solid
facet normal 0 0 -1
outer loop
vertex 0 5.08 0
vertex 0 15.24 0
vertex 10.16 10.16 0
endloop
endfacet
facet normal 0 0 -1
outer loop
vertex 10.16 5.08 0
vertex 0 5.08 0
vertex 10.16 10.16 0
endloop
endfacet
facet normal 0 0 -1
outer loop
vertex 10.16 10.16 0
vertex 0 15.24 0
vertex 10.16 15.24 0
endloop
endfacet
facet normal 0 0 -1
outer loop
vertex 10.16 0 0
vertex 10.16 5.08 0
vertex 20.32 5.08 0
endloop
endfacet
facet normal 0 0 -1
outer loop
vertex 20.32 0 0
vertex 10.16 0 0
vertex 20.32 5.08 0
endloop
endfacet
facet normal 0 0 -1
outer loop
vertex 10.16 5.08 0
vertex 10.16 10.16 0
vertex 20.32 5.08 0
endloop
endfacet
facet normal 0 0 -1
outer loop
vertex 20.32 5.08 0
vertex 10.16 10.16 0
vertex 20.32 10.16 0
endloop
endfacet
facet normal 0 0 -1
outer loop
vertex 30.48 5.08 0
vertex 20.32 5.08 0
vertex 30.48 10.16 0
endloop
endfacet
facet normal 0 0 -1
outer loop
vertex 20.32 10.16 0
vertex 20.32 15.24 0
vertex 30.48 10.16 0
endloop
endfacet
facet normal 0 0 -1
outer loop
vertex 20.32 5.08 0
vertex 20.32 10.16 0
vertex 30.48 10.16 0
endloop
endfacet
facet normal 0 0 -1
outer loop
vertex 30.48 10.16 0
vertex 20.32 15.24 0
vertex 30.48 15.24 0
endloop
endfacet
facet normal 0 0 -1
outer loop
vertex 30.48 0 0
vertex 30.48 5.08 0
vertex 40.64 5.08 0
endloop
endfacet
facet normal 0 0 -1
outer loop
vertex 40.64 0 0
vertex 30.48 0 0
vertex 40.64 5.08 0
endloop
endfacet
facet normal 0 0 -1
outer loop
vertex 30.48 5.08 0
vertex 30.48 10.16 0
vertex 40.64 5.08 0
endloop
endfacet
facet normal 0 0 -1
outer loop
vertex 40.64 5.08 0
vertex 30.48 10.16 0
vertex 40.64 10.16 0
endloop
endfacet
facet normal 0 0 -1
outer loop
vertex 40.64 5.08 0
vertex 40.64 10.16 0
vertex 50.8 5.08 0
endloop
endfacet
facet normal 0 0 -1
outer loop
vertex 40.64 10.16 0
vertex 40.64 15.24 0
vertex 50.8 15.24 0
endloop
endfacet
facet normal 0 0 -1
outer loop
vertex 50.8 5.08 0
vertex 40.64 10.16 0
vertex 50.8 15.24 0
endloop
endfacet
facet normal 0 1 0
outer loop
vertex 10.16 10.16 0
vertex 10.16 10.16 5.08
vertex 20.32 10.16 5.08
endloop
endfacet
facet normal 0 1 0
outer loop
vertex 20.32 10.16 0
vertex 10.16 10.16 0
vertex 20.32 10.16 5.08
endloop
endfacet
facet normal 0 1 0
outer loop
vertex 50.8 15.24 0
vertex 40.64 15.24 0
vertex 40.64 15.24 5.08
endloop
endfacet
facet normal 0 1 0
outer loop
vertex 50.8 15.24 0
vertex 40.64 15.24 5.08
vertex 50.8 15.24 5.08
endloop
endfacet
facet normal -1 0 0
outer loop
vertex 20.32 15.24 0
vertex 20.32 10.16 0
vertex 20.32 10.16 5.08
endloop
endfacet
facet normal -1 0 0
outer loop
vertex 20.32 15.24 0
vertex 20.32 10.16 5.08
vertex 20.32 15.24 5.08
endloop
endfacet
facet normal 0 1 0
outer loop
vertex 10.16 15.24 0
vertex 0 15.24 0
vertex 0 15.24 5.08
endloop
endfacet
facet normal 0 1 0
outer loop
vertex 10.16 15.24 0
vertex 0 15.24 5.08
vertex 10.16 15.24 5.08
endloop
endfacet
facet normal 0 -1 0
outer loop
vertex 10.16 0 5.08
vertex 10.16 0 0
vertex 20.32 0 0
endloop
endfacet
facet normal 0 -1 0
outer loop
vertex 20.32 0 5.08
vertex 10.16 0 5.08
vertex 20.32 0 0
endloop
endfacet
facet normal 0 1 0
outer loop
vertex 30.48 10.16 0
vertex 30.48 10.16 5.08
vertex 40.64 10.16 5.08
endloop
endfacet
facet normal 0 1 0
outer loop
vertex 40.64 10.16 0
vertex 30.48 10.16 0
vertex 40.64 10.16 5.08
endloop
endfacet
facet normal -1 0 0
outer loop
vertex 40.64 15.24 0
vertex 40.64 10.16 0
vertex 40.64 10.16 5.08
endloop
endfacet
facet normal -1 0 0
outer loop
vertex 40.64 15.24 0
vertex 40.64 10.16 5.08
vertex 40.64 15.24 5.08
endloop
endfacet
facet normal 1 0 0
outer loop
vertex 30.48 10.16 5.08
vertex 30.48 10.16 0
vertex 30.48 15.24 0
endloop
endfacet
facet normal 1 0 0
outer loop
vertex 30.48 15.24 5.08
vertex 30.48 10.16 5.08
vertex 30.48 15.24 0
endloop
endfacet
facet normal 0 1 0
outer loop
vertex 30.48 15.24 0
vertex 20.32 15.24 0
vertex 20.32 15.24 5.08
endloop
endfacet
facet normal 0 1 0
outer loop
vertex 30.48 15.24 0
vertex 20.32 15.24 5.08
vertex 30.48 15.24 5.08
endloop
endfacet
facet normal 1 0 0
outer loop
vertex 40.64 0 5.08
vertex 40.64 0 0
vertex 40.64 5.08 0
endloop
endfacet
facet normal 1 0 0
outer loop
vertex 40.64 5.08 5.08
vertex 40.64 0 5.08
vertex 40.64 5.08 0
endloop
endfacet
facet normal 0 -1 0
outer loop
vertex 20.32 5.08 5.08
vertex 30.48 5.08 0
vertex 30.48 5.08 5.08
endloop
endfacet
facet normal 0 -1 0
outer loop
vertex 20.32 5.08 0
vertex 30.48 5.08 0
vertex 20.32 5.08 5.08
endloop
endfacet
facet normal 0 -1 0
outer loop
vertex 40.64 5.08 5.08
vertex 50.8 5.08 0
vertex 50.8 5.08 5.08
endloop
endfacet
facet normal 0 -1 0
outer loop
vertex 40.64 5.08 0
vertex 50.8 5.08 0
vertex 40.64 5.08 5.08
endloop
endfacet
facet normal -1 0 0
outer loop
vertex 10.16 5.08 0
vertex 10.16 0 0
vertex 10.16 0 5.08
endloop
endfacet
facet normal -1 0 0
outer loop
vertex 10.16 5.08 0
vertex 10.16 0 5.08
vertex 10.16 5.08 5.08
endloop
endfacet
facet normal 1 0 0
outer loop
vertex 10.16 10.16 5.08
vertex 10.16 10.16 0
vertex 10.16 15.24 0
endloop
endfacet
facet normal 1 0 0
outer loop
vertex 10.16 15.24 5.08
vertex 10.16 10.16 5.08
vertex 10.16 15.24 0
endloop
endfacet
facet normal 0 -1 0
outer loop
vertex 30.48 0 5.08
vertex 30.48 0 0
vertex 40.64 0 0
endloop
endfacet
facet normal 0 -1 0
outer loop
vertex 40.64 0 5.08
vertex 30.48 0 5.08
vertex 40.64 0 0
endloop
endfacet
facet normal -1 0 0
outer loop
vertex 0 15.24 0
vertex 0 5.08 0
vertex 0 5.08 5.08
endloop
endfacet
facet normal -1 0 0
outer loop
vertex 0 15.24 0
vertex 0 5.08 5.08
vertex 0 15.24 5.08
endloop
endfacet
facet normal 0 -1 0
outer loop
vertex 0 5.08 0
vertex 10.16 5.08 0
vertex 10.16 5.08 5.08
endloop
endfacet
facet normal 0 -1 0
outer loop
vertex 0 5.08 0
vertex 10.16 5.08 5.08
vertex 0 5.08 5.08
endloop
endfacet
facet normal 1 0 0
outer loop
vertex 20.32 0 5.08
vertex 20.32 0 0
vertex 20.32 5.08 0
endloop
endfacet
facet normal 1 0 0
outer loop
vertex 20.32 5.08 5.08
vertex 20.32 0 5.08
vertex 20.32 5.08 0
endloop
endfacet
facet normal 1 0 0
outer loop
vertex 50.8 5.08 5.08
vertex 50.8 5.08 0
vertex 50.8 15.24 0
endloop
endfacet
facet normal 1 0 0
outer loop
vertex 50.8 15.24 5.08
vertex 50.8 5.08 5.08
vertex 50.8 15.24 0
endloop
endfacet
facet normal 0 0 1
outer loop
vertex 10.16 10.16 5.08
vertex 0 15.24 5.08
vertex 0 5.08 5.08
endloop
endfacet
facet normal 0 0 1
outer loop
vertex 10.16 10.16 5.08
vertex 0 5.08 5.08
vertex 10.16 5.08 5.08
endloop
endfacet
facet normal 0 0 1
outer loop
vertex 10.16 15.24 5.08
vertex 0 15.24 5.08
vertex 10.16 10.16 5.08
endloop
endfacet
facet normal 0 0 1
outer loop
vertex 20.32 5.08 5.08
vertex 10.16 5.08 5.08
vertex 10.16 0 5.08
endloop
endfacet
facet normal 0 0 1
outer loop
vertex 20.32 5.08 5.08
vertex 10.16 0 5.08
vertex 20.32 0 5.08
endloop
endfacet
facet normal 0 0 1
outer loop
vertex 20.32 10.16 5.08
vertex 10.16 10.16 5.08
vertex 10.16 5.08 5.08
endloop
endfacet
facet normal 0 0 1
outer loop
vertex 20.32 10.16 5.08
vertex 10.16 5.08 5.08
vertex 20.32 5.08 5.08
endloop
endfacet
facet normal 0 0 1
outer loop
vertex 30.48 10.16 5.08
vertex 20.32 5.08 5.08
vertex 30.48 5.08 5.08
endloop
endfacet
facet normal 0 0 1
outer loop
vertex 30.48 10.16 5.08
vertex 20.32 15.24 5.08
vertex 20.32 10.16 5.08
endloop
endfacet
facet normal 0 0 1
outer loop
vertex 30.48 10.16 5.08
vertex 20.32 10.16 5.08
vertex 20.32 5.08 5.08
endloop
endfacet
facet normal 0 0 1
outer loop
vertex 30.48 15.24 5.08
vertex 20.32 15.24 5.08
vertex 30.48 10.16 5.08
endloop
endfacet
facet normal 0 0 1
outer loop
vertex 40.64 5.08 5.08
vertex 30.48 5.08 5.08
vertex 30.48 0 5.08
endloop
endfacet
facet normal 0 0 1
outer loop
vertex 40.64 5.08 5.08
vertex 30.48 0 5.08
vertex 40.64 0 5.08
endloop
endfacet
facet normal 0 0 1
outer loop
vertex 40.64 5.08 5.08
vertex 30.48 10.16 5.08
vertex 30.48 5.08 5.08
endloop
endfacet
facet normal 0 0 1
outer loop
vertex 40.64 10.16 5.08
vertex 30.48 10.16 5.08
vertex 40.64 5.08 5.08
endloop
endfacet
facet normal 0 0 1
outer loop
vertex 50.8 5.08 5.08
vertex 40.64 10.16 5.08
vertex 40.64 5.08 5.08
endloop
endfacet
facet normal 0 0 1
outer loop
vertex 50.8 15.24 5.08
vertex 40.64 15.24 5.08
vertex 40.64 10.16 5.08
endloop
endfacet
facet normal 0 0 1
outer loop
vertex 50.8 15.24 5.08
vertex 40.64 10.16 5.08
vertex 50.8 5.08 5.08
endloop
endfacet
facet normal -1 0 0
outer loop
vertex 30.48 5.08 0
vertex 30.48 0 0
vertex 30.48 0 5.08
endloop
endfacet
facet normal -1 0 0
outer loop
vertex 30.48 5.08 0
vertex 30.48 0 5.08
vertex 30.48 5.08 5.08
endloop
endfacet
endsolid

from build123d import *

# Parameters (mm, degrees)
SKETCH1_W           = 50.8
SKETCH1_H           = 15.24
BOSS_EXTRUDE1_DEPTH = 5.08
CUT_EXTRUDE2_REACH  = 7.08
SKETCH3_W           = 10.16
SKETCH3_H           = 5.08
CUT_EXTRUDE3_REACH  = 7.08
SKETCH4_W           = 10.16
SKETCH4_H           = 5.08


with BuildPart() as part:
    # Sketch1 → Boss-Extrude1 (new body)
    with BuildSketch(Plane.XY):
        with Locations((25.4, 7.62)):
            Rectangle(SKETCH1_W, SKETCH1_H)
    extrude(amount=BOSS_EXTRUDE1_DEPTH)

    # Sketch3 → Cut-Extrude2 (cut, up to next)
    with BuildSketch(Plane(origin=(0, 0, 0), x_dir=(-1, 0, 0), z_dir=(0, 0, -1)), mode=Mode.PRIVATE) as cut_extrude2_sk1:
        with Locations((-5.08, 2.54)):
            Rectangle(SKETCH3_W, SKETCH3_H)
    cut_extrude2_tool1 = extrude(cut_extrude2_sk1.sketch, amount=-CUT_EXTRUDE2_REACH, mode=Mode.PRIVATE) & part.part
    add(cut_extrude2_tool1.solids().sort_by_distance((5.08, 2.54, 0))[0], mode=Mode.SUBTRACT)
    # Sketch3 → Cut-Extrude2 (cut, up to next)
    with BuildSketch(Plane(origin=(0, 0, 0), x_dir=(-1, 0, 0), z_dir=(0, 0, -1)), mode=Mode.PRIVATE) as cut_extrude2_sk2:
        with Locations((-25.4, 2.54)):
            Rectangle(SKETCH3_W, SKETCH3_H)
    cut_extrude2_tool2 = extrude(cut_extrude2_sk2.sketch, amount=-CUT_EXTRUDE2_REACH, mode=Mode.PRIVATE) & part.part
    add(cut_extrude2_tool2.solids().sort_by_distance((25.4, 2.54, 0))[0], mode=Mode.SUBTRACT)
    # Sketch3 → Cut-Extrude2 (cut, up to next)
    with BuildSketch(Plane(origin=(0, 0, 0), x_dir=(-1, 0, 0), z_dir=(0, 0, -1)), mode=Mode.PRIVATE) as cut_extrude2_sk3:
        with Locations((-45.72, 2.54)):
            Rectangle(SKETCH3_W, SKETCH3_H)
    cut_extrude2_tool3 = extrude(cut_extrude2_sk3.sketch, amount=-CUT_EXTRUDE2_REACH, mode=Mode.PRIVATE) & part.part
    add(cut_extrude2_tool3.solids().sort_by_distance((45.72, 2.54, 0))[0], mode=Mode.SUBTRACT)

    # Sketch4 → Cut-Extrude3 (cut, up to next)
    with BuildSketch(Plane.XY.offset(5.08), mode=Mode.PRIVATE) as cut_extrude3_sk1:
        with Locations((15.24, 12.7)):
            Rectangle(SKETCH4_W, SKETCH4_H)
    cut_extrude3_tool1 = extrude(cut_extrude3_sk1.sketch, amount=-CUT_EXTRUDE3_REACH, mode=Mode.PRIVATE) & part.part
    add(cut_extrude3_tool1.solids().sort_by_distance((15.24, 12.7, 5.08))[0], mode=Mode.SUBTRACT)
    # Sketch4 → Cut-Extrude3 (cut, up to next)
    with BuildSketch(Plane.XY.offset(5.08), mode=Mode.PRIVATE) as cut_extrude3_sk2:
        with Locations((35.56, 12.7)):
            Rectangle(SKETCH4_W, SKETCH4_H)
    cut_extrude3_tool2 = extrude(cut_extrude3_sk2.sketch, amount=-CUT_EXTRUDE3_REACH, mode=Mode.PRIVATE) & part.part
    add(cut_extrude3_tool2.solids().sort_by_distance((35.56, 12.7, 5.08))[0], mode=Mode.SUBTRACT)


solid = part.part
